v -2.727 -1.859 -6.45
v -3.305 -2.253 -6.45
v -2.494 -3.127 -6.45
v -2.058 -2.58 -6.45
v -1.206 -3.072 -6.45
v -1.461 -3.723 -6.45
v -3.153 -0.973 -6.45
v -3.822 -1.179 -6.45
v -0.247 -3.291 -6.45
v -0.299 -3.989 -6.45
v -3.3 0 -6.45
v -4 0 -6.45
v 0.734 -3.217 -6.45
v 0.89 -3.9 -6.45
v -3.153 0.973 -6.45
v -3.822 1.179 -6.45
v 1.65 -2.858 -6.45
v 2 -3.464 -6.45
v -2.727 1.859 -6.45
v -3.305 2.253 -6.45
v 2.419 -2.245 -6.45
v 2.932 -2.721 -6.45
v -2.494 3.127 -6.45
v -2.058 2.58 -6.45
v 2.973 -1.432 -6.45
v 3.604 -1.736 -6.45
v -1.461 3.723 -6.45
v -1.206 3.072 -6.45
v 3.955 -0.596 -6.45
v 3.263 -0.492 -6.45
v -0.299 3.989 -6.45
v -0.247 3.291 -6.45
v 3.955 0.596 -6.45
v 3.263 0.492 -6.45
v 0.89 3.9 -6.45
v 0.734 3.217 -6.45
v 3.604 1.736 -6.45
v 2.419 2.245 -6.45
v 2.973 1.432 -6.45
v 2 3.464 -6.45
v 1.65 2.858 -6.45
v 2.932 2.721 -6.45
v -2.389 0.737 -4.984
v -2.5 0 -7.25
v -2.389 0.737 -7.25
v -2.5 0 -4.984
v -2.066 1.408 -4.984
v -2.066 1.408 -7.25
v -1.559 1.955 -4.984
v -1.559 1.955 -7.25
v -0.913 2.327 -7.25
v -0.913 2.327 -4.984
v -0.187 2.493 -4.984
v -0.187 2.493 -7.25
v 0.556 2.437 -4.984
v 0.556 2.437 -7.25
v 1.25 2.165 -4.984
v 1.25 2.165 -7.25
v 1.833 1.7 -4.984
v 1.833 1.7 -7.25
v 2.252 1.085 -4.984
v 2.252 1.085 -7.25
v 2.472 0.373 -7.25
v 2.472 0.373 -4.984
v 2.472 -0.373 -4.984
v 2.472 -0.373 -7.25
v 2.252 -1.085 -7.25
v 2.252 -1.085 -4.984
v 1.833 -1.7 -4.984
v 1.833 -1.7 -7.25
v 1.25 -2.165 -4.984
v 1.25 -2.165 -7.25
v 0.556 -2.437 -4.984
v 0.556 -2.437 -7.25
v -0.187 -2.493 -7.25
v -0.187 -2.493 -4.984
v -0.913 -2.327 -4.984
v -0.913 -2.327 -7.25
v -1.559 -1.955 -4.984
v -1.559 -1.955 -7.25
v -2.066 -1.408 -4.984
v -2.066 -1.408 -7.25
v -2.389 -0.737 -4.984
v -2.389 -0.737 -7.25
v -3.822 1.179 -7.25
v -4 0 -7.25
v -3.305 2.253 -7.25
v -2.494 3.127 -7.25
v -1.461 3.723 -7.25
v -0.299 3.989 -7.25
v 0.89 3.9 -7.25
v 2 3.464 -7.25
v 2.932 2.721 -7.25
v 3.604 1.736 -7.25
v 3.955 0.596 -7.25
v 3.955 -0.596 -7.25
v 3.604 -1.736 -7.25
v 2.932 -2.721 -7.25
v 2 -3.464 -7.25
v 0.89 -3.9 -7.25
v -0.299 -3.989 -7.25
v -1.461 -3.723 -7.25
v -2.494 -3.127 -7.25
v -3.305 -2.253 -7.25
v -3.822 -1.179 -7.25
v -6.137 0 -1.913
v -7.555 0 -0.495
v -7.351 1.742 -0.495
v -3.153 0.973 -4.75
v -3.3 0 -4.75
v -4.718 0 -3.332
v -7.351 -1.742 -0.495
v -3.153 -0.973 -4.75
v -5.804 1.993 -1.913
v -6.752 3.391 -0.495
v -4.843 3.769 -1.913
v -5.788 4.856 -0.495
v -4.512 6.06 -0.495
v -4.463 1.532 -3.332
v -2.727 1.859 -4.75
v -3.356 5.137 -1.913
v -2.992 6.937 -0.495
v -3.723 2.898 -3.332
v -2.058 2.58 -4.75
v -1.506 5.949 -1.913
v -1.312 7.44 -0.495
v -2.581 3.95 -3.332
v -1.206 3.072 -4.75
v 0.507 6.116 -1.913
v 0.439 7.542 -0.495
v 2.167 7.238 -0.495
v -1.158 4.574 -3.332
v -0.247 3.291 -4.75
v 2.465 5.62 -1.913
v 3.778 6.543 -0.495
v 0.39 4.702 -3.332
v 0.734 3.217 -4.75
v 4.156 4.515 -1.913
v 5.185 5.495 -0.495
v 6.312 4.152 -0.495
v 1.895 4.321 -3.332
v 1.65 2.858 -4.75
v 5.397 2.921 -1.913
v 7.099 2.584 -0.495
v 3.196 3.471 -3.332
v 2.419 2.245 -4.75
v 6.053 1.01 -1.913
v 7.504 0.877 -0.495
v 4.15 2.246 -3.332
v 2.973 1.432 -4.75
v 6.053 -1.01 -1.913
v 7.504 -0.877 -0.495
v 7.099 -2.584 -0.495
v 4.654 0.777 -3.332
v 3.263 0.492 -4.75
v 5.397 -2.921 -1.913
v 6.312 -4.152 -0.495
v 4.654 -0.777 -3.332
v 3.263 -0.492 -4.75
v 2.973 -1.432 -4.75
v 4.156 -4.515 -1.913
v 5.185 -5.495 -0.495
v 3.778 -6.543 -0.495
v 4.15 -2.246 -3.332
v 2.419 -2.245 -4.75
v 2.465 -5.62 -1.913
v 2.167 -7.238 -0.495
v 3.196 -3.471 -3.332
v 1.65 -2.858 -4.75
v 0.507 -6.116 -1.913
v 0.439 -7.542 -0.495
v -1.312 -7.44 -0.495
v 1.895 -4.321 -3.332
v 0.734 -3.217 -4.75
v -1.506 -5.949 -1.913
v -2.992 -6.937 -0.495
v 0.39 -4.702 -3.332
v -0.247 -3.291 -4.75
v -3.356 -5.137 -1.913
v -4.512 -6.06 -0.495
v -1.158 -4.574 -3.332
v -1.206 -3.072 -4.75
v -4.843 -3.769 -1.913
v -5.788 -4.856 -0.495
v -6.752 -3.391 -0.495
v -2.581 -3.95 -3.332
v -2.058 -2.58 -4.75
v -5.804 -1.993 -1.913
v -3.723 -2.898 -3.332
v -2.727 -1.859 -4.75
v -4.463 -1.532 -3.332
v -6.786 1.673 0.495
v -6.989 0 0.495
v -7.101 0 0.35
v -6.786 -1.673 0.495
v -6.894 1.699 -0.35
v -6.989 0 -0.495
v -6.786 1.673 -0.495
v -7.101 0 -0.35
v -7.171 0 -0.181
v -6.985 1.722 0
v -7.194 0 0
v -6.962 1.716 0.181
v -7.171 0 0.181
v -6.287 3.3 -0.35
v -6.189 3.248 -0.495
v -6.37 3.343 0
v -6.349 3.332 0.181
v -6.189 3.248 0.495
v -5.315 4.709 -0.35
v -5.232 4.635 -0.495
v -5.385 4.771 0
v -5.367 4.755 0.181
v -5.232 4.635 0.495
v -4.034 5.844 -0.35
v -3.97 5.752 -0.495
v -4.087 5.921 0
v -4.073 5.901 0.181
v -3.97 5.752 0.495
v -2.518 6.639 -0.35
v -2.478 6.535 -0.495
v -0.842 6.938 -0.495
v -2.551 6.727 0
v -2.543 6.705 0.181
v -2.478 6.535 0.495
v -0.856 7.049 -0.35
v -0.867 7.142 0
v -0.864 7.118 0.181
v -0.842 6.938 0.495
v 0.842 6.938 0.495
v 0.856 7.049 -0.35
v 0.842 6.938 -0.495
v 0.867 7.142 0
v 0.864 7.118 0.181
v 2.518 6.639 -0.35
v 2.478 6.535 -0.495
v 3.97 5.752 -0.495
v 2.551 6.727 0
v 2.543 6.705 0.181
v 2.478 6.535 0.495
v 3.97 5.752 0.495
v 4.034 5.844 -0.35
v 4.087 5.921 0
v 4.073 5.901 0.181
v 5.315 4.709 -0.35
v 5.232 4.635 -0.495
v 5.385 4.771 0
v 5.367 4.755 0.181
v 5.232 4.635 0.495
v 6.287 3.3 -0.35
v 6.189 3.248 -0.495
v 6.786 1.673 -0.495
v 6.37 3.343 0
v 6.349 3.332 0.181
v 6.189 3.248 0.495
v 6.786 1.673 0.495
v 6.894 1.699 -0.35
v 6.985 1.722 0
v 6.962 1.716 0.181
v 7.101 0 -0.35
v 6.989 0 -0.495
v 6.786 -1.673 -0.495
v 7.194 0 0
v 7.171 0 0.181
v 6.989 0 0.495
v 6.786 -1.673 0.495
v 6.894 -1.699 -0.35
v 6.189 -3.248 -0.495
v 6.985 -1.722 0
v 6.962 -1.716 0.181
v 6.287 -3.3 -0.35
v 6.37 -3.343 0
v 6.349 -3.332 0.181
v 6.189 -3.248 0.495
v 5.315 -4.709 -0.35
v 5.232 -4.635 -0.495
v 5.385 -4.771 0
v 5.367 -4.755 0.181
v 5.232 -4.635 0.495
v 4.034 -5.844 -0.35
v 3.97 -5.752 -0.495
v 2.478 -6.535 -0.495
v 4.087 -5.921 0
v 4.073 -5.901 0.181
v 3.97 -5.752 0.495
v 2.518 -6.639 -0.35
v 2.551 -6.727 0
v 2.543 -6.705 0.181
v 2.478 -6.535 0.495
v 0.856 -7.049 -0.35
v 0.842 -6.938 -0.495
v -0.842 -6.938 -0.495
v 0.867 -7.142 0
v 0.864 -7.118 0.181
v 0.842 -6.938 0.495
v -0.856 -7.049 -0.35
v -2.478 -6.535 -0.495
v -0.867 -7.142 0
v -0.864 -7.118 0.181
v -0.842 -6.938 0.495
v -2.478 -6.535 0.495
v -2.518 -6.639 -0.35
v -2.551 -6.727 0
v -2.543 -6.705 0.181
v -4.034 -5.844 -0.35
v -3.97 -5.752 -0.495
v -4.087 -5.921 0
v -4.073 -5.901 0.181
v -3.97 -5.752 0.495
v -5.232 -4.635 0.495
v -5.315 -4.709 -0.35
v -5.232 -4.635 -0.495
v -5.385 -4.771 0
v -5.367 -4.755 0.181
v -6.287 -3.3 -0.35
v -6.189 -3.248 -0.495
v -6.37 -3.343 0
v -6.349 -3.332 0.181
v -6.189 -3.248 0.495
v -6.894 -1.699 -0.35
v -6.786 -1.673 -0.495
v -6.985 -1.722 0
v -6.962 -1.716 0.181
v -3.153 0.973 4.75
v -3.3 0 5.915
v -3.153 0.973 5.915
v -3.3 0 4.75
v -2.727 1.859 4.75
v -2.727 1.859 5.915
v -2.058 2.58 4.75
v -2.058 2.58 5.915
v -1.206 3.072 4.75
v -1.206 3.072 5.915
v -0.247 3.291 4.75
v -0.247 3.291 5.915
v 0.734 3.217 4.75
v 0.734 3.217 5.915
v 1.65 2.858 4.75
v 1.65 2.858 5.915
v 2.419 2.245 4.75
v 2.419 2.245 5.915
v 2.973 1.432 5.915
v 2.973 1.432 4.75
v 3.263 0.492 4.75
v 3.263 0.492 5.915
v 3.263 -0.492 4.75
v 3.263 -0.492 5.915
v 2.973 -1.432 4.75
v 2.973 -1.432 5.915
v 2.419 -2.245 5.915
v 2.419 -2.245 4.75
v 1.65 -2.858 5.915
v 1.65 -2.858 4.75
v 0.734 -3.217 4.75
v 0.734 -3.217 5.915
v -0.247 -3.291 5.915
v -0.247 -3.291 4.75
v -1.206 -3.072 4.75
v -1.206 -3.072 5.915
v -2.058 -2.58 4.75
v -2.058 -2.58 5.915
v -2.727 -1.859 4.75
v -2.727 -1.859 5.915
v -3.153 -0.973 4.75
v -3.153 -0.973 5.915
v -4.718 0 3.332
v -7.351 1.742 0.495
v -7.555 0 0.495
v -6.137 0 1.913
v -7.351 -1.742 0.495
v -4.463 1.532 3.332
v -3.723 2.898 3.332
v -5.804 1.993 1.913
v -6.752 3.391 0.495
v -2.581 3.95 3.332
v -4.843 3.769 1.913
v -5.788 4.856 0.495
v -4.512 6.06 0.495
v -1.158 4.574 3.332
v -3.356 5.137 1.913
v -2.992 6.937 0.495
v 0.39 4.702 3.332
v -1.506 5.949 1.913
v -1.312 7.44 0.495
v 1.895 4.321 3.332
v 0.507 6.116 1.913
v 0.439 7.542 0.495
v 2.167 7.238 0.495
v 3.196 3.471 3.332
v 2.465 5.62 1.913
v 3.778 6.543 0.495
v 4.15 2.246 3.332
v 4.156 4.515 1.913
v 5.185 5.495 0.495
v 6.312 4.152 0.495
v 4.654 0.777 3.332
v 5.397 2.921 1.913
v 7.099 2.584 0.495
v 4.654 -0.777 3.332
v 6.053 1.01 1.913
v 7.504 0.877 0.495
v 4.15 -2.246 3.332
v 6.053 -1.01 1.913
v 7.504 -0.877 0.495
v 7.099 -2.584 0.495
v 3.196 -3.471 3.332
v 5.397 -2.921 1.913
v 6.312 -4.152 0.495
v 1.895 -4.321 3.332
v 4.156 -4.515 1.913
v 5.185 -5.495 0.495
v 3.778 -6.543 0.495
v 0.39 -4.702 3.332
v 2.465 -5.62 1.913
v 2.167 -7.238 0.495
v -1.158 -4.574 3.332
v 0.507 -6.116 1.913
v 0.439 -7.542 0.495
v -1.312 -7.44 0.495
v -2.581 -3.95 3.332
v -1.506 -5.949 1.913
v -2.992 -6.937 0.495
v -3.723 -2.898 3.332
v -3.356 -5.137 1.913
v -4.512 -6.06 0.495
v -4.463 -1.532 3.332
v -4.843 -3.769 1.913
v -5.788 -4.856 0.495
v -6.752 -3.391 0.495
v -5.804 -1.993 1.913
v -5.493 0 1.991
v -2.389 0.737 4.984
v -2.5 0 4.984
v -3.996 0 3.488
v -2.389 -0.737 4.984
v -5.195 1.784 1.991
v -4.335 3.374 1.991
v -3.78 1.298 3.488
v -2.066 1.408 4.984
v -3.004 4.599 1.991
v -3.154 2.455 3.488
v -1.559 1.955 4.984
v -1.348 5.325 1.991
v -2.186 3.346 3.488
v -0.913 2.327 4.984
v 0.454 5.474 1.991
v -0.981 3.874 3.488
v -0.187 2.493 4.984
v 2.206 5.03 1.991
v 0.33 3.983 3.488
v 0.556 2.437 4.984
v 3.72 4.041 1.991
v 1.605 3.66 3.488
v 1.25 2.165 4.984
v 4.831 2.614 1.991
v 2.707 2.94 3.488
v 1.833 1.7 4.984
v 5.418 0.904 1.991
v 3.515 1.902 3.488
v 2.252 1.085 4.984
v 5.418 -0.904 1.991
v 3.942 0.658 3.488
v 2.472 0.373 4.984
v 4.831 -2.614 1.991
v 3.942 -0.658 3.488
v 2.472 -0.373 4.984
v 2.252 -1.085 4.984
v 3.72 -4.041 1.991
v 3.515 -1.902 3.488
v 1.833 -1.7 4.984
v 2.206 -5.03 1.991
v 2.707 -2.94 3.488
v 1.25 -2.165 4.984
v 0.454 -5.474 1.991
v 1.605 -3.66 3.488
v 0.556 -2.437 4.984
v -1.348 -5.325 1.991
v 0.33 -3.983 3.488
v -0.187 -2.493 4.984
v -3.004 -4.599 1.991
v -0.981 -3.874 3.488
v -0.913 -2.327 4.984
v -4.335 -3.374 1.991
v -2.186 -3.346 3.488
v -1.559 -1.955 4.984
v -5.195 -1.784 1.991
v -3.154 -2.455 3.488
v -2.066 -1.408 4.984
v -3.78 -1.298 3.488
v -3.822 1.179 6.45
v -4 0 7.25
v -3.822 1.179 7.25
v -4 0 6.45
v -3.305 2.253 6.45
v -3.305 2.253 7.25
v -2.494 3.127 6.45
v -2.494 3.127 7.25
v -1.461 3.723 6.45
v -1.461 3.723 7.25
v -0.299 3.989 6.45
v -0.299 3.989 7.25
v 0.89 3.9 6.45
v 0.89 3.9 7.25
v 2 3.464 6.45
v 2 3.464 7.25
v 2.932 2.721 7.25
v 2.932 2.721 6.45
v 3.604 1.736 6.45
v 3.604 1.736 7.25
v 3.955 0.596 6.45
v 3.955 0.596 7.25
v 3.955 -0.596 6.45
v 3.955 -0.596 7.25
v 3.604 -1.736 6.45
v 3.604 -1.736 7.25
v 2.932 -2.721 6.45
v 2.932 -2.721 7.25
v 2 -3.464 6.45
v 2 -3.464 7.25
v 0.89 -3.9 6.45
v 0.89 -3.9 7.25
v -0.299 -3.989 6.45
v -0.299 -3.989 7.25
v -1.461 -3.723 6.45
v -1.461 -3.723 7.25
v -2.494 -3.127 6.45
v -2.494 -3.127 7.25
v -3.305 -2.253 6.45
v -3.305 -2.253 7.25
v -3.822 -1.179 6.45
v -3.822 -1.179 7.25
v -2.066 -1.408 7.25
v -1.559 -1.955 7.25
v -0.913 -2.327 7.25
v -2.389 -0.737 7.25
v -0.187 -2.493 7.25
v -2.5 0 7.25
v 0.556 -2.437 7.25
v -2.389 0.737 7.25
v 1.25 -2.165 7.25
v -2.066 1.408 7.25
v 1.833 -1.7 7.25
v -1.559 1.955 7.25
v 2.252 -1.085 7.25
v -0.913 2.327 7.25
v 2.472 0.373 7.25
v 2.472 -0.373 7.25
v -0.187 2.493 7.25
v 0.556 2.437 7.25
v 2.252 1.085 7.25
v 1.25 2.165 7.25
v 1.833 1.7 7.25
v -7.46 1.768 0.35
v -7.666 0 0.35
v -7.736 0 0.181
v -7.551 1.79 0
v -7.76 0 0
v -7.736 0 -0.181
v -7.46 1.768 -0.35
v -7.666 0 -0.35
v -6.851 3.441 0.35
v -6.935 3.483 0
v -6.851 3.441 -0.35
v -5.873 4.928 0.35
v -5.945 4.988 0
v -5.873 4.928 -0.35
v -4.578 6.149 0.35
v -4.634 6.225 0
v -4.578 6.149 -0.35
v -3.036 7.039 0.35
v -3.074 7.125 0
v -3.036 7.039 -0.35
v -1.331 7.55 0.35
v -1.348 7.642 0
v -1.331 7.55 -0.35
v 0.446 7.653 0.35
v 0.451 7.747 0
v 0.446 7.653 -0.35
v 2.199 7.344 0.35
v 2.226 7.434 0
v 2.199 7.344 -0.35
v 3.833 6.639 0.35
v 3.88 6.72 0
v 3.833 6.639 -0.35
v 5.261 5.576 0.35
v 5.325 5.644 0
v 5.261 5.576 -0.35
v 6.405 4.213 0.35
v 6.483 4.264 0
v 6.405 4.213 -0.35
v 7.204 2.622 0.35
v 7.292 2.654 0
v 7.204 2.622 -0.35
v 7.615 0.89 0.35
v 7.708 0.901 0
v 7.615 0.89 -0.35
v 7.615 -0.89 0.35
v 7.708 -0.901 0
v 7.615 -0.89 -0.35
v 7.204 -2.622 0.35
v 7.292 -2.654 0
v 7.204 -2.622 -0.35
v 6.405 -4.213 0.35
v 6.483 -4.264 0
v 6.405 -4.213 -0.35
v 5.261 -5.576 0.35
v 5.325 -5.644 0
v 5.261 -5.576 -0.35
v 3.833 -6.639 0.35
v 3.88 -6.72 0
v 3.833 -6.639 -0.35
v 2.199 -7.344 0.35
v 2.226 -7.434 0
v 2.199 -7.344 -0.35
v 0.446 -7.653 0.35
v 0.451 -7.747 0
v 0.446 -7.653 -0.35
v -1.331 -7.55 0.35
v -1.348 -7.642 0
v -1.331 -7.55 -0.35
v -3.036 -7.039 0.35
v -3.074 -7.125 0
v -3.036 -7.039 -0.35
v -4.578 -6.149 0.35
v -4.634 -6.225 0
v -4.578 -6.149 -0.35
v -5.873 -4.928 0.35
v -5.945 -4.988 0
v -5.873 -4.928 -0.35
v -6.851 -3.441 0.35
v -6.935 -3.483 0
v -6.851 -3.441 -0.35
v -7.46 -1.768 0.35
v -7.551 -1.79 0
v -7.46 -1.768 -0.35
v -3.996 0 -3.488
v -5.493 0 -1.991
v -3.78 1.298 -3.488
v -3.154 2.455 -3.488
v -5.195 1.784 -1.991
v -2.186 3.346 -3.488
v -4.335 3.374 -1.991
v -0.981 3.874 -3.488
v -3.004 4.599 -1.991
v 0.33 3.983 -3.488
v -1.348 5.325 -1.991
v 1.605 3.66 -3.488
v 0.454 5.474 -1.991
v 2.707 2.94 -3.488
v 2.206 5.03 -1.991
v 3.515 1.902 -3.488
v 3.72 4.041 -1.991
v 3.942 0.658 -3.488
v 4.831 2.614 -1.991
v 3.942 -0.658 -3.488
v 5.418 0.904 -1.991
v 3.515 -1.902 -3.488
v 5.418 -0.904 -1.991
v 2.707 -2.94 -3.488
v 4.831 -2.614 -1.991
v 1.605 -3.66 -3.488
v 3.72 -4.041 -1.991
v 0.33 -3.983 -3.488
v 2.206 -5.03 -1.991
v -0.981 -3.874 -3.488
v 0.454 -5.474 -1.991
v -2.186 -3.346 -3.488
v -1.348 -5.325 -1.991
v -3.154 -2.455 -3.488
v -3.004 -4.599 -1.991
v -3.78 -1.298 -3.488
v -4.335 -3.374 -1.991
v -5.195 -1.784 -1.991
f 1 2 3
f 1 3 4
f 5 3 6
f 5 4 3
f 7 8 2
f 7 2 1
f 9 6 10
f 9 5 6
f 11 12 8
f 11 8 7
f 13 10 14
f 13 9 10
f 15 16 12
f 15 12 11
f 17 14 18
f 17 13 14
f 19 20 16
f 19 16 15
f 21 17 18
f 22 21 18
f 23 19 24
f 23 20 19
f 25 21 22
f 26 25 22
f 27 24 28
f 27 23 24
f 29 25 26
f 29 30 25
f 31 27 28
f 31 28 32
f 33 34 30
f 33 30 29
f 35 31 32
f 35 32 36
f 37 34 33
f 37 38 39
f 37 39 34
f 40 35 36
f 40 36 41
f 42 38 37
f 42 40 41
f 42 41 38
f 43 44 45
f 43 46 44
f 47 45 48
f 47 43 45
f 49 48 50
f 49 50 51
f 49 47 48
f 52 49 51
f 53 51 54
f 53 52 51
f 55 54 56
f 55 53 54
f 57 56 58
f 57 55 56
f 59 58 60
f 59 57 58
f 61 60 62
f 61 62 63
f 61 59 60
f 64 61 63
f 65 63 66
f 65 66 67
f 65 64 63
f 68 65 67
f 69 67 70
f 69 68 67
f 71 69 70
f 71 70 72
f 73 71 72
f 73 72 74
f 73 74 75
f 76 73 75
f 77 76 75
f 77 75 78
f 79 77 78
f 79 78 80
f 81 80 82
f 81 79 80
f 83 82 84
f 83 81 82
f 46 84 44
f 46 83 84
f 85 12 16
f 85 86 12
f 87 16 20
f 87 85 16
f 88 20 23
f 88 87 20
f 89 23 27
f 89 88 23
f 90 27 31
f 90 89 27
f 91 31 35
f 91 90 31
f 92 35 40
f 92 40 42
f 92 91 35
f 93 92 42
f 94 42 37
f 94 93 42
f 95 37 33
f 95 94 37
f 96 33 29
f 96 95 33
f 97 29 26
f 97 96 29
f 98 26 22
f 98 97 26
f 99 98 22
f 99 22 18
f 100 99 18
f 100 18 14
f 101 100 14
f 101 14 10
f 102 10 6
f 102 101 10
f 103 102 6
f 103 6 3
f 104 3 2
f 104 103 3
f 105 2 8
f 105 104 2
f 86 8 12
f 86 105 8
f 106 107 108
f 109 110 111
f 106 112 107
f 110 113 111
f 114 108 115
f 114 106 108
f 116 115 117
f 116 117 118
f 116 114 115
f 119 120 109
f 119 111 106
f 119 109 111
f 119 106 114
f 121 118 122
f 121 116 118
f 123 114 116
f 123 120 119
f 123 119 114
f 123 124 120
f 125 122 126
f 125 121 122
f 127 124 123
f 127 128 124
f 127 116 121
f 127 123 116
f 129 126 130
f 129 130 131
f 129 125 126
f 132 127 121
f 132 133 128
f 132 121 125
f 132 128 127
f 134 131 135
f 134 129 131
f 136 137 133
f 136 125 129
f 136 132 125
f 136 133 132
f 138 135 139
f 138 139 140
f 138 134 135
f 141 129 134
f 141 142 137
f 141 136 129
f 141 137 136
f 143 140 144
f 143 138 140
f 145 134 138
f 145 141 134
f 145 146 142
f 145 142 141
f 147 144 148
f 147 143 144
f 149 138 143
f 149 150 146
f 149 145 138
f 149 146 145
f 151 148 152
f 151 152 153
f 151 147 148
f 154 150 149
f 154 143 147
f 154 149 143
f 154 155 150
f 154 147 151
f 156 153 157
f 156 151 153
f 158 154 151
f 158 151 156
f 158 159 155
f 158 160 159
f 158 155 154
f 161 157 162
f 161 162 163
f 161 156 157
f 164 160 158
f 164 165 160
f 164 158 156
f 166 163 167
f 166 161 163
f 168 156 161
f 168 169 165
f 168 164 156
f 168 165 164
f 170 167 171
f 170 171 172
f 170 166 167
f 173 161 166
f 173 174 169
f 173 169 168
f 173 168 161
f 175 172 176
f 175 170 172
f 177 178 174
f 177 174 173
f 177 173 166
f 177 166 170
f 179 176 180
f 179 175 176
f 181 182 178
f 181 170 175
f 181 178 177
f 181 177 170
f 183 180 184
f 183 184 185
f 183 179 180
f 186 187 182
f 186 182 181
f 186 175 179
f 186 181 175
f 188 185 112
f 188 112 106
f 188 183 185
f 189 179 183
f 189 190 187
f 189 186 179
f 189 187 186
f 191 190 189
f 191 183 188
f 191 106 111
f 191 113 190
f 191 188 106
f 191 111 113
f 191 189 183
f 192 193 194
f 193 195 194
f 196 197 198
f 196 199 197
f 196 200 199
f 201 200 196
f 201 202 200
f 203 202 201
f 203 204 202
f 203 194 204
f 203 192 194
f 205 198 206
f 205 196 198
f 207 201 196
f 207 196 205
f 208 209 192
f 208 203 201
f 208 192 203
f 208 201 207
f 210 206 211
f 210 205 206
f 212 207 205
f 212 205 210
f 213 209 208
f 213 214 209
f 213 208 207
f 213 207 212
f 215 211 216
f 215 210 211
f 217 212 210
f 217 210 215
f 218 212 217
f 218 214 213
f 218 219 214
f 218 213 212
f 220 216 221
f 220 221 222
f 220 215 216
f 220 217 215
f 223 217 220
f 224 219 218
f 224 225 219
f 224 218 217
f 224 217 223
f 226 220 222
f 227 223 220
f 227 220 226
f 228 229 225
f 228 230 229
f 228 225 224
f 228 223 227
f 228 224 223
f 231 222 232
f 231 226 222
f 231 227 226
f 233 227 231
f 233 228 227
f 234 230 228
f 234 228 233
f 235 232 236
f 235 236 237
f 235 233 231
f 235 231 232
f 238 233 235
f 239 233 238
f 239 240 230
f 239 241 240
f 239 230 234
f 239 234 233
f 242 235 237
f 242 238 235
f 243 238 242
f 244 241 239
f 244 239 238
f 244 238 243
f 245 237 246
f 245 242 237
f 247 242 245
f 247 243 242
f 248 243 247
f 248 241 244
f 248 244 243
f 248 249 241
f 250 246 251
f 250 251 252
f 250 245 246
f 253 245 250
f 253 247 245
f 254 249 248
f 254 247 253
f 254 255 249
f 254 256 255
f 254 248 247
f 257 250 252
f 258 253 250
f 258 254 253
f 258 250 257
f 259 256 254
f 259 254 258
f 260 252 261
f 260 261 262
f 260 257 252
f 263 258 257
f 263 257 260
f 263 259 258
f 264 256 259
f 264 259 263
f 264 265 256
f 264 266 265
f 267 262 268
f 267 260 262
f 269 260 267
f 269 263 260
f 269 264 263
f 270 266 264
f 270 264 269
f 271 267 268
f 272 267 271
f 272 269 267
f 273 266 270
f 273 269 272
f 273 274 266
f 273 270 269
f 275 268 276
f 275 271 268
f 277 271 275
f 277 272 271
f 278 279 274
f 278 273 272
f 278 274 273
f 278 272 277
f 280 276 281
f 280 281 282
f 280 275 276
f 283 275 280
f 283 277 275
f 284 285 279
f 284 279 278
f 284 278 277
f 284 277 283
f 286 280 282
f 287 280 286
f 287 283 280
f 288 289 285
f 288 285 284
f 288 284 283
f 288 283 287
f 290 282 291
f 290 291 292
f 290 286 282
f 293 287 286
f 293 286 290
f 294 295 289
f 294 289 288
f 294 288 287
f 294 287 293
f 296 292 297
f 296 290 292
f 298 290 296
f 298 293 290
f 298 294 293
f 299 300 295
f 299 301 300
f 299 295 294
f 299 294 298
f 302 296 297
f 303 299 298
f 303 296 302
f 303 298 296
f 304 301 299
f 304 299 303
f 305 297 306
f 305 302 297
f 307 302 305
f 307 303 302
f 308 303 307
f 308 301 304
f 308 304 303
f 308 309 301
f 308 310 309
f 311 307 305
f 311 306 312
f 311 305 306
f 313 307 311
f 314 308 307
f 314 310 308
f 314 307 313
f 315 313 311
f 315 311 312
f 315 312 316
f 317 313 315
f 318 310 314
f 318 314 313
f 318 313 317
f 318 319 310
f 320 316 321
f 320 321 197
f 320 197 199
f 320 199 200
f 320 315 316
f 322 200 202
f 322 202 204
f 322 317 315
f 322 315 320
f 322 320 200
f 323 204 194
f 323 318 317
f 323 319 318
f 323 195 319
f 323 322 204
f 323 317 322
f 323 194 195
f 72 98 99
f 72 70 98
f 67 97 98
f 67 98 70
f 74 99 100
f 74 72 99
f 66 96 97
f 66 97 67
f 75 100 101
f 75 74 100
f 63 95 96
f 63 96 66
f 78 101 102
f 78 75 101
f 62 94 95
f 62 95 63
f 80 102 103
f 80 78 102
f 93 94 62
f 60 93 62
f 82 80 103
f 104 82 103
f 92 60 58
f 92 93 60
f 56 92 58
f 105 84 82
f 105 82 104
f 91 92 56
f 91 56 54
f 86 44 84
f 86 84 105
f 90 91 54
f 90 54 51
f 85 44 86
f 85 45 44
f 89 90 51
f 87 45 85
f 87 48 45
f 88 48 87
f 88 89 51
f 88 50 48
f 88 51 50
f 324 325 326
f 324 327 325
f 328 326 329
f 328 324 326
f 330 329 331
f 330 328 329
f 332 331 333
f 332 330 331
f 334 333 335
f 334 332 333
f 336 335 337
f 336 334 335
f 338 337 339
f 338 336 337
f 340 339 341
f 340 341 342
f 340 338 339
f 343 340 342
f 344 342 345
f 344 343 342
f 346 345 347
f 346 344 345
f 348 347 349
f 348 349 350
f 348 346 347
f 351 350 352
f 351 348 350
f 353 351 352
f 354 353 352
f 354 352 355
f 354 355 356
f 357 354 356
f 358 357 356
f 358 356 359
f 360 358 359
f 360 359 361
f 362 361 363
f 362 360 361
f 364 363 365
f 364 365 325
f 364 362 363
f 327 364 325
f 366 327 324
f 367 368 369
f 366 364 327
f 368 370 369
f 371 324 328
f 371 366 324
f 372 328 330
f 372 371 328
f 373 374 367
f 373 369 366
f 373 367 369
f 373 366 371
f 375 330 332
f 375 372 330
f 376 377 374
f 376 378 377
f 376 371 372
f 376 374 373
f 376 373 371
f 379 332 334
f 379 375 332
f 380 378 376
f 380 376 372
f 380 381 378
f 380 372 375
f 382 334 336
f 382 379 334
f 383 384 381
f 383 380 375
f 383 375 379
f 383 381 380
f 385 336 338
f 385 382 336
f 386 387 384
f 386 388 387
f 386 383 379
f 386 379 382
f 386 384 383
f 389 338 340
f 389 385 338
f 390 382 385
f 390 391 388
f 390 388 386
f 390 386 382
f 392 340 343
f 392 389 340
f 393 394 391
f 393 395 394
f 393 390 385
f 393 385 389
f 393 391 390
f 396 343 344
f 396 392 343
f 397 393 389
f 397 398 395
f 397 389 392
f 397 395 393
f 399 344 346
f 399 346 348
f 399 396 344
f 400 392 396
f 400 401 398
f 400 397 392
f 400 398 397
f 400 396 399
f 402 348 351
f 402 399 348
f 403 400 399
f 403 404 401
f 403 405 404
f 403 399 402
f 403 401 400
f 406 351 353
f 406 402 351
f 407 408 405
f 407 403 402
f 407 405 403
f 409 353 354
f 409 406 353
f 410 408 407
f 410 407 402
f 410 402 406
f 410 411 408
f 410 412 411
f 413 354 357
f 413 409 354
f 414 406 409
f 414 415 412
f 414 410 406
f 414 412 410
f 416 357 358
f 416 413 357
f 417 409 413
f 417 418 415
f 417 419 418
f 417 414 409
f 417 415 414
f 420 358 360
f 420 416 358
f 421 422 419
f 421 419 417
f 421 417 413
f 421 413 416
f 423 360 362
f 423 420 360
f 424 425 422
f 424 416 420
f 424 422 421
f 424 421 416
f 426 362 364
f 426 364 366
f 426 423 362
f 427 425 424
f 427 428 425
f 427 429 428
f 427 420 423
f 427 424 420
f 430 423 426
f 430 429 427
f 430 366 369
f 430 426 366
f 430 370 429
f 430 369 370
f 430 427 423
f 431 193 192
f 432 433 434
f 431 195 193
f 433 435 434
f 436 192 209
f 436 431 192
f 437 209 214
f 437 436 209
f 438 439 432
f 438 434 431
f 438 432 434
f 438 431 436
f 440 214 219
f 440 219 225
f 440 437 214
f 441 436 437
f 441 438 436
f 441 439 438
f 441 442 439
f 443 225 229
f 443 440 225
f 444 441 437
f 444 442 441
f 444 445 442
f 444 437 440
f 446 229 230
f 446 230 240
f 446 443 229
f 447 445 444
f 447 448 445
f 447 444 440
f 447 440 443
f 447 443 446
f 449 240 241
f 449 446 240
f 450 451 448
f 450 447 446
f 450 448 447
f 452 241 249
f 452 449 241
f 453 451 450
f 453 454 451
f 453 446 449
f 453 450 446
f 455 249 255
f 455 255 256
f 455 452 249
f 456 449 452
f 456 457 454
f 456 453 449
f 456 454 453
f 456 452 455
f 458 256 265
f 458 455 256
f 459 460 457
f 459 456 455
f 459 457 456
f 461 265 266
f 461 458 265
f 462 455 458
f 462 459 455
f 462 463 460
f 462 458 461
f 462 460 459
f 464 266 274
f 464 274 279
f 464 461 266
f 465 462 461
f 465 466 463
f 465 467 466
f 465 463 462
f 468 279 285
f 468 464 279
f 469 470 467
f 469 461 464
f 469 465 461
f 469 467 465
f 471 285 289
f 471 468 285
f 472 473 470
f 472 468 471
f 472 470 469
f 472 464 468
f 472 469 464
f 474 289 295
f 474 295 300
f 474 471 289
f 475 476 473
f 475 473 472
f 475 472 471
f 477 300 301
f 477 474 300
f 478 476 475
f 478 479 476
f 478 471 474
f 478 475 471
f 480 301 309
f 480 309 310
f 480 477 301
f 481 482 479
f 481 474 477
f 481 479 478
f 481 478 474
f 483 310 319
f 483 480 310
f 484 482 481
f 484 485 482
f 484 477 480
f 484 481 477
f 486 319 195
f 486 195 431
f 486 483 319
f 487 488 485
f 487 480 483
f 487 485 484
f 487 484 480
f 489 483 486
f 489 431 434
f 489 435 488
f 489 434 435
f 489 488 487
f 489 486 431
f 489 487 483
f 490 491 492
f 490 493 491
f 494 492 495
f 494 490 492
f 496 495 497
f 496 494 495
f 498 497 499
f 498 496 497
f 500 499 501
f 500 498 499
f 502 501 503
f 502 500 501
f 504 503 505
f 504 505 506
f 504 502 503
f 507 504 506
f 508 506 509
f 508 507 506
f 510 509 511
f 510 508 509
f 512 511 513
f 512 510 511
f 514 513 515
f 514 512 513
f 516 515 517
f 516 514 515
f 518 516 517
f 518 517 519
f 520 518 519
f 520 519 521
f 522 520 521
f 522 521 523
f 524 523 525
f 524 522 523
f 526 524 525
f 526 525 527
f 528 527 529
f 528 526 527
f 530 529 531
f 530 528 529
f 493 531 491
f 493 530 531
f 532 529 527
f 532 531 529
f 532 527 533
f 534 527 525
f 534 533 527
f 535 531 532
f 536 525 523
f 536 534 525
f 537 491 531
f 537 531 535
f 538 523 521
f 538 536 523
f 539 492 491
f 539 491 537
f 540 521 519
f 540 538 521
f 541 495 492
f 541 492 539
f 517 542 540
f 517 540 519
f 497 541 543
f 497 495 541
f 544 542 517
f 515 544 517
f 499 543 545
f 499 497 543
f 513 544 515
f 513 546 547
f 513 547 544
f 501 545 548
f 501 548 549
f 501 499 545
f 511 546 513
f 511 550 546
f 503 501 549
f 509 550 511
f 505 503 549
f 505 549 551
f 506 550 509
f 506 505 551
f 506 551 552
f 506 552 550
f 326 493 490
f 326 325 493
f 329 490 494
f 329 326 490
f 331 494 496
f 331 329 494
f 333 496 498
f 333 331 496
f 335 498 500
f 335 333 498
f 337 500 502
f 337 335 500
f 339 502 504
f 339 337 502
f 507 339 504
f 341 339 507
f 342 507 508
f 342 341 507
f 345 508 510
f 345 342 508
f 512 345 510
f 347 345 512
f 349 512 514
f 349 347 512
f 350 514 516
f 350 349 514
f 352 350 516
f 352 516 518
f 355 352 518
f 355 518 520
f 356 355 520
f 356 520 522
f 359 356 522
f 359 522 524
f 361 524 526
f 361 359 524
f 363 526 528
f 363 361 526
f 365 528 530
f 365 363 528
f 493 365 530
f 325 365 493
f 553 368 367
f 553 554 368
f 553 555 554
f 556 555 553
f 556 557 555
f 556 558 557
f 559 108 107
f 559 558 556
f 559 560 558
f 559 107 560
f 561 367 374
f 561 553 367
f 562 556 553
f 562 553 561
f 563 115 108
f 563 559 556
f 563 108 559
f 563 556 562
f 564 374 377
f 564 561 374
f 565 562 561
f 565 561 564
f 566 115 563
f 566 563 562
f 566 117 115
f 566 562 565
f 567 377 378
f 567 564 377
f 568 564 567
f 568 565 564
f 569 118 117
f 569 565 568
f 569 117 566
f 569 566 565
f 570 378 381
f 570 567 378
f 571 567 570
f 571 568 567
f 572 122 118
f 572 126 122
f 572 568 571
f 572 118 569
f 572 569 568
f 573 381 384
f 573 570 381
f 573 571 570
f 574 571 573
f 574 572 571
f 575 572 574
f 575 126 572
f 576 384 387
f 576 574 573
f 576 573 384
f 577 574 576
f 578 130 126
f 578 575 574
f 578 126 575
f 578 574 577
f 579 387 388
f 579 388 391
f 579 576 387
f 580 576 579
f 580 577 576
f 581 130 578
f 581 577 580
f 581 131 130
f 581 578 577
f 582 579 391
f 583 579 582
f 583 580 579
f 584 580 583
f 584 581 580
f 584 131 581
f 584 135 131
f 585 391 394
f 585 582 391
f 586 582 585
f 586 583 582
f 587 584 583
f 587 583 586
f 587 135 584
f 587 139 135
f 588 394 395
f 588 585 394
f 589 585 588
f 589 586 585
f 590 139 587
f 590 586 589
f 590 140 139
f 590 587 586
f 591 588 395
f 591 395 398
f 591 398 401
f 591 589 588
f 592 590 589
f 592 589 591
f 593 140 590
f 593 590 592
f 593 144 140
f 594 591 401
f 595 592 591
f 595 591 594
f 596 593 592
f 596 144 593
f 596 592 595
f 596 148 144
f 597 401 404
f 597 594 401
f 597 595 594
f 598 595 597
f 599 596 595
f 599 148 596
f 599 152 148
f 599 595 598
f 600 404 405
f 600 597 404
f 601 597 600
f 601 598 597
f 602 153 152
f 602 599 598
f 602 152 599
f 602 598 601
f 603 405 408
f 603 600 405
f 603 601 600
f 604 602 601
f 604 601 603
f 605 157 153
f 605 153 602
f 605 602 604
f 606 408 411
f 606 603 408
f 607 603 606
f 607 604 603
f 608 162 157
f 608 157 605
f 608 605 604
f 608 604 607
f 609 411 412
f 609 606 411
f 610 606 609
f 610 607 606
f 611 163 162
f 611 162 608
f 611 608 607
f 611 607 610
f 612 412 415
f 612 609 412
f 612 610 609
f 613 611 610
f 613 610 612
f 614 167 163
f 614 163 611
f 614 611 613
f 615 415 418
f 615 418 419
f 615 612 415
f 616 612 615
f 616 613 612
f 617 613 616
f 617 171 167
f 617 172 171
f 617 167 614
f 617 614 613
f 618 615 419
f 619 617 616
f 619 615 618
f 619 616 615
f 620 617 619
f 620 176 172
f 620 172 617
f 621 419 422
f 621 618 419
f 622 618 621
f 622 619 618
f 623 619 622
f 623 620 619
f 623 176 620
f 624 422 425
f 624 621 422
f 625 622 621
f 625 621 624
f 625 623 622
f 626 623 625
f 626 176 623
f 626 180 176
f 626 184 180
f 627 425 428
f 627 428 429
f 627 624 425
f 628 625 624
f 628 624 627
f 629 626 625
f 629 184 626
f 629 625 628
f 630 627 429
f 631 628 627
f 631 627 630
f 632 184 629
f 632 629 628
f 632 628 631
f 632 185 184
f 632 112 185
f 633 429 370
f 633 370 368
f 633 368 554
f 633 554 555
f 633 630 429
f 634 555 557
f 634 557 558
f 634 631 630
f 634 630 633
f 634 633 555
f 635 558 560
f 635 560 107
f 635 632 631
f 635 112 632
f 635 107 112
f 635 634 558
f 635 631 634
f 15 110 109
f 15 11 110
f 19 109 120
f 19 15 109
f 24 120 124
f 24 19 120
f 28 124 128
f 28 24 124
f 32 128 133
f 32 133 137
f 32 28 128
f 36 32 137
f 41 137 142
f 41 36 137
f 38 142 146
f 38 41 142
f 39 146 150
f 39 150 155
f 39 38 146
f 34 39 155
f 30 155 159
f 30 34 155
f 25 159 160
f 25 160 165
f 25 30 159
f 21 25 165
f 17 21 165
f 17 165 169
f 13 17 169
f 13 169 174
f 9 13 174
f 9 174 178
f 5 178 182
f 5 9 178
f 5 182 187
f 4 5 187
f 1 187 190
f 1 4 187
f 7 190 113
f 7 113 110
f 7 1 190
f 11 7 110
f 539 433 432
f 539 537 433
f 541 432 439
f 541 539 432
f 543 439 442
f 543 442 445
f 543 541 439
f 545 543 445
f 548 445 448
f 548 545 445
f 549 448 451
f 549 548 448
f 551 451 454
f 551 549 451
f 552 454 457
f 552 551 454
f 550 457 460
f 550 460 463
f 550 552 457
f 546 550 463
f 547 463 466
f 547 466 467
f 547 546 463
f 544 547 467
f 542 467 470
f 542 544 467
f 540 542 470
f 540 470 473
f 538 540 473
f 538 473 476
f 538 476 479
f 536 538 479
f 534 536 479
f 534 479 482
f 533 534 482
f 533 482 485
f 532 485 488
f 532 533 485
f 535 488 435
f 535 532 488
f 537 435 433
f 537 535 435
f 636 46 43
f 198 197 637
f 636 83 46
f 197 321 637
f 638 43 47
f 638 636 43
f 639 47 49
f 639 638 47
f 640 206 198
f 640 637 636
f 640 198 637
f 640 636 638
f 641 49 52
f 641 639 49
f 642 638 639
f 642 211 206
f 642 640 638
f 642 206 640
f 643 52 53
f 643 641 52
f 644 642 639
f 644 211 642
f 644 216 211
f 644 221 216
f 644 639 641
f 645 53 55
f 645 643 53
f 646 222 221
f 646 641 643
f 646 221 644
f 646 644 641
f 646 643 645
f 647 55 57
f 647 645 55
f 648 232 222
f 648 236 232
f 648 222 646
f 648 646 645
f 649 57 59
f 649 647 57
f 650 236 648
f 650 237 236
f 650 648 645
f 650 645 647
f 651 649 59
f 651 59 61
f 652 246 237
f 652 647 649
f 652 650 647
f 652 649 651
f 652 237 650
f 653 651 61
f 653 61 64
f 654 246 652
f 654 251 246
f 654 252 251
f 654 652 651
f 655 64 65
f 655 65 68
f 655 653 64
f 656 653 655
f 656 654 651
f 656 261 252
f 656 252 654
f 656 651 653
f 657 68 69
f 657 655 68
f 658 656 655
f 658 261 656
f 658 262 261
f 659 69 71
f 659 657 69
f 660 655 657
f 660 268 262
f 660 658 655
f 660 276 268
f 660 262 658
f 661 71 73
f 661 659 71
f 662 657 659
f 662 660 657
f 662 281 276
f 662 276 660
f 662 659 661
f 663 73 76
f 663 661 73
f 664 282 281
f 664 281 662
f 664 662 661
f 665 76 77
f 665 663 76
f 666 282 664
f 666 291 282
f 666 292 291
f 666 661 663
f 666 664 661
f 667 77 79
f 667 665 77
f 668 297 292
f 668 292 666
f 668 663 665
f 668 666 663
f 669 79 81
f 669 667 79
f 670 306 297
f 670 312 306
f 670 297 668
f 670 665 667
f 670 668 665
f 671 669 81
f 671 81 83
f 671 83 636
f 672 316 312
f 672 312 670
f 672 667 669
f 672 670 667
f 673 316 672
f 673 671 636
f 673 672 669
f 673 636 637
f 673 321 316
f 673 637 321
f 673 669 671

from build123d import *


with BuildPart() as f1:
    # F0 (on Front) → F1 (revolve)
    with BuildSketch(Plane.XZ):
        with BuildLine():
            Line((-2.5, 4.984315), (-2.5, 7.25))
            Line((-2.5, 7.25), (-4, 7.25))
            Line((-4, 7.25), (-4, 6.45))
            Line((-4, 6.45), (-3.3, 5.914898))
            Line((-3.3, 5.914898), (-3.3, 4.75))
            Line((-3.3, 4.75), (-7.555127, 0.494873))
            ThreePointArc((-7.555127, 0.494873), (-7.76011, 0), (-7.555127, -0.494873))
            Line((-7.555127, -0.494873), (-3.3, -4.75))
            Line((-3.3, -4.75), (-3.3, -6.45))
            Line((-3.3, -6.45), (-4, -6.45))
            Line((-4, -6.45), (-4, -7.25))
            Line((-4, -7.25), (-2.5, -7.25))
            Line((-2.5, -7.25), (-2.5, -4.984315))
            Line((-2.5, -4.984315), (-6.989442, -0.494872))
            ThreePointArc((-6.989442, -0.494872), (-7.194425, 0), (-6.989442, 0.494872))
            Line((-6.989442, 0.494872), (-2.5, 4.984315))
        make_face()
    revolve(axis=Axis((0, 0, -0.799421), (0, 0, -1)))


solid = f1.part
